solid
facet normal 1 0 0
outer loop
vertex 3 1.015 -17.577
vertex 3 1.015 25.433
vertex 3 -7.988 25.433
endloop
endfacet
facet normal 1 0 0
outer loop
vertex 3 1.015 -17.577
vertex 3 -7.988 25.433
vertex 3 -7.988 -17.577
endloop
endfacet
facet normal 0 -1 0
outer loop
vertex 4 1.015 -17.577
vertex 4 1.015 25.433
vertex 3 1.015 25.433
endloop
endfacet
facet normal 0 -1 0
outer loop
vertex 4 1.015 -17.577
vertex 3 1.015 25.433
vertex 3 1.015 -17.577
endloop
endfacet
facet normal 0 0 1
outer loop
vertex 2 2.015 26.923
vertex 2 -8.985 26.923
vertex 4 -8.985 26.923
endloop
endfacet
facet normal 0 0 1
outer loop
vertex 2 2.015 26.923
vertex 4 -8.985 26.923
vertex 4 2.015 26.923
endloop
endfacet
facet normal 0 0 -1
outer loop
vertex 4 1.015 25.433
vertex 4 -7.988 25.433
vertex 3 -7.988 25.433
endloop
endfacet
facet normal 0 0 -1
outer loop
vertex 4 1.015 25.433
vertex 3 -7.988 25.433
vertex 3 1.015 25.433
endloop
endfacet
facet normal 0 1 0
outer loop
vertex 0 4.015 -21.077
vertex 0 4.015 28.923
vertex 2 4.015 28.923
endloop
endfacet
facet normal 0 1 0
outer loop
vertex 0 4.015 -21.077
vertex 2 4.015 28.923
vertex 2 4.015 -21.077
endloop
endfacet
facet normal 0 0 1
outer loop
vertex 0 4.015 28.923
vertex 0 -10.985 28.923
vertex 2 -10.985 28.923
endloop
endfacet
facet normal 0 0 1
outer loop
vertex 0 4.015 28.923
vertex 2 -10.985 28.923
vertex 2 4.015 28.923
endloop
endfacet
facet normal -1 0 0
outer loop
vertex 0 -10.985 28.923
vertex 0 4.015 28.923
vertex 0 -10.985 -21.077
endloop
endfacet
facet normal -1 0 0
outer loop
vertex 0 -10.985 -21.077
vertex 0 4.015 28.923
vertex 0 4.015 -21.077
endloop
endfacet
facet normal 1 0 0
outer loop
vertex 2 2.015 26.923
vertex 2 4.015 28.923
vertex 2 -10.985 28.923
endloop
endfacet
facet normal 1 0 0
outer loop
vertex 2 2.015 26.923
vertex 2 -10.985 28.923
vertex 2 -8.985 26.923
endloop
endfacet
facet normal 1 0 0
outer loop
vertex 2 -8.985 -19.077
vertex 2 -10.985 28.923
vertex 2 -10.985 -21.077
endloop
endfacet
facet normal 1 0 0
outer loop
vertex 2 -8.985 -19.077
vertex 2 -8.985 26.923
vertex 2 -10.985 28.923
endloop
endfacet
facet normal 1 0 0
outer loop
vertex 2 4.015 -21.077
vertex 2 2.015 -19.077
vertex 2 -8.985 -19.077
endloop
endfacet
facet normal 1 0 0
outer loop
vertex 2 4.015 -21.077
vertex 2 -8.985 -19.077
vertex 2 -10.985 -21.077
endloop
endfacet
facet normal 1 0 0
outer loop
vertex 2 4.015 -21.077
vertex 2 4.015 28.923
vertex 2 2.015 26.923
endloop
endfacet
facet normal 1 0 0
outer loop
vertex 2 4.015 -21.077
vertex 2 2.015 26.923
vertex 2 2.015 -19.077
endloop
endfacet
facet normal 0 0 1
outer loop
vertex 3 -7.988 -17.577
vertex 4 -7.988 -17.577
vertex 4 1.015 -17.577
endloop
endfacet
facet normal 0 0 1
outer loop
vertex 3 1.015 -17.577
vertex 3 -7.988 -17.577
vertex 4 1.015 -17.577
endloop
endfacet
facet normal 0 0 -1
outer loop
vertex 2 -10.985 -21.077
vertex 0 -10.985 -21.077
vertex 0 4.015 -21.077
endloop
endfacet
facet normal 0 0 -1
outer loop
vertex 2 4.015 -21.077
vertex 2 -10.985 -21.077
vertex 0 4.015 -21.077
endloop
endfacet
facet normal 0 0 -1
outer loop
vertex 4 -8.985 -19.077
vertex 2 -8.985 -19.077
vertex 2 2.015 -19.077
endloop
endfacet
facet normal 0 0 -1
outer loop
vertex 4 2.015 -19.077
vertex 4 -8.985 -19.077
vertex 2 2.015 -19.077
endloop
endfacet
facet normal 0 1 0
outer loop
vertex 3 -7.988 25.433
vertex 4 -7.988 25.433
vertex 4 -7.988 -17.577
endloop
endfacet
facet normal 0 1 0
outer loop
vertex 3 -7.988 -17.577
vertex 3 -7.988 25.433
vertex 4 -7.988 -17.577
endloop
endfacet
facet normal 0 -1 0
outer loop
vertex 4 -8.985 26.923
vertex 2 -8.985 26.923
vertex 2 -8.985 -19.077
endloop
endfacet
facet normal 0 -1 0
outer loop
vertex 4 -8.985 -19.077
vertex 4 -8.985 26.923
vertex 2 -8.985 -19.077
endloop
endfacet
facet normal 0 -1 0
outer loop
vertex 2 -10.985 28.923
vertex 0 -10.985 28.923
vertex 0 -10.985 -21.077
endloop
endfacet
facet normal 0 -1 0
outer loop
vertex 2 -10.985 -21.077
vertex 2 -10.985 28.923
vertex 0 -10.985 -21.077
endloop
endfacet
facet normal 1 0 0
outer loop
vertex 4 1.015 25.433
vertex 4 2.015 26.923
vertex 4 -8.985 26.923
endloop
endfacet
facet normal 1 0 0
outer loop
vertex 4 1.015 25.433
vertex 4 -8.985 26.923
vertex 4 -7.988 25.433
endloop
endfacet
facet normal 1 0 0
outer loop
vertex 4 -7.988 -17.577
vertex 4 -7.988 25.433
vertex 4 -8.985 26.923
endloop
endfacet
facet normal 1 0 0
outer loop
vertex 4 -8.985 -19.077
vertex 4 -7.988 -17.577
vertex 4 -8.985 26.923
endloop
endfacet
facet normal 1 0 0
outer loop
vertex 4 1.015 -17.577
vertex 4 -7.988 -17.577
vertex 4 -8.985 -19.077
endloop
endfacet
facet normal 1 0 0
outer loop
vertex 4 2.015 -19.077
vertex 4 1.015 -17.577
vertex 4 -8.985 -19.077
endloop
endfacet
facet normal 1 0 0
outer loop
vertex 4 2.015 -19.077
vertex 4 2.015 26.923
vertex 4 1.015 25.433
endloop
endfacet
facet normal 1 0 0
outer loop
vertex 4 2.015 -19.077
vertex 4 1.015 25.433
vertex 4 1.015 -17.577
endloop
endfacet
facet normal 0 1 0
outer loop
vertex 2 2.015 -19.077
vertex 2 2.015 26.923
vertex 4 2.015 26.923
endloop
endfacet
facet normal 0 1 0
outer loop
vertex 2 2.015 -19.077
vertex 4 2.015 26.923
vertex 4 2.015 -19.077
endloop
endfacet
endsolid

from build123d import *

# Parameters (mm, degrees)
SKETCH2_W           = 50
SKETCH2_H           = 15
BOSS_EXTRUDE1_DEPTH = 2
SKETCH4_W           = 46
SKETCH4_H           = 11
BOSS_EXTRUDE2_DEPTH = 2
SKETCH5_W           = 43.009657984
SKETCH5_H           = 9.00272897
CUT_EXTRUDE1_DEPTH  = 1


with BuildPart() as part:
    # Sketch2 → Boss-Extrude1 (new body)
    with BuildSketch(Plane(origin=(0, 0, 0), x_dir=(0, 0, -1), z_dir=(1, 0, 0))):
        with Locations((-3.923357664, -3.48540146)):
            Rectangle(SKETCH2_W, SKETCH2_H)
    extrude(amount=BOSS_EXTRUDE1_DEPTH)

    # Sketch4 → Boss-Extrude2 (add)
    with BuildSketch(Plane(origin=(2, 0, 0), x_dir=(0, 0, -1), z_dir=(1, 0, 0))):
        with Locations((-3.923357664, -3.48540146)):
            Rectangle(SKETCH4_W, SKETCH4_H)
    extrude(amount=BOSS_EXTRUDE2_DEPTH)

    # Sketch5 → Cut-Extrude1 (cut)
    with BuildSketch(Plane(origin=(4, 0, 0), x_dir=(0, 0, -1), z_dir=(1, 0, 0))):
        with Locations((-3.928186656, -3.486765945)):
            Rectangle(SKETCH5_W, SKETCH5_H)
    extrude(amount=-CUT_EXTRUDE1_DEPTH, mode=Mode.SUBTRACT)


solid = part.part
